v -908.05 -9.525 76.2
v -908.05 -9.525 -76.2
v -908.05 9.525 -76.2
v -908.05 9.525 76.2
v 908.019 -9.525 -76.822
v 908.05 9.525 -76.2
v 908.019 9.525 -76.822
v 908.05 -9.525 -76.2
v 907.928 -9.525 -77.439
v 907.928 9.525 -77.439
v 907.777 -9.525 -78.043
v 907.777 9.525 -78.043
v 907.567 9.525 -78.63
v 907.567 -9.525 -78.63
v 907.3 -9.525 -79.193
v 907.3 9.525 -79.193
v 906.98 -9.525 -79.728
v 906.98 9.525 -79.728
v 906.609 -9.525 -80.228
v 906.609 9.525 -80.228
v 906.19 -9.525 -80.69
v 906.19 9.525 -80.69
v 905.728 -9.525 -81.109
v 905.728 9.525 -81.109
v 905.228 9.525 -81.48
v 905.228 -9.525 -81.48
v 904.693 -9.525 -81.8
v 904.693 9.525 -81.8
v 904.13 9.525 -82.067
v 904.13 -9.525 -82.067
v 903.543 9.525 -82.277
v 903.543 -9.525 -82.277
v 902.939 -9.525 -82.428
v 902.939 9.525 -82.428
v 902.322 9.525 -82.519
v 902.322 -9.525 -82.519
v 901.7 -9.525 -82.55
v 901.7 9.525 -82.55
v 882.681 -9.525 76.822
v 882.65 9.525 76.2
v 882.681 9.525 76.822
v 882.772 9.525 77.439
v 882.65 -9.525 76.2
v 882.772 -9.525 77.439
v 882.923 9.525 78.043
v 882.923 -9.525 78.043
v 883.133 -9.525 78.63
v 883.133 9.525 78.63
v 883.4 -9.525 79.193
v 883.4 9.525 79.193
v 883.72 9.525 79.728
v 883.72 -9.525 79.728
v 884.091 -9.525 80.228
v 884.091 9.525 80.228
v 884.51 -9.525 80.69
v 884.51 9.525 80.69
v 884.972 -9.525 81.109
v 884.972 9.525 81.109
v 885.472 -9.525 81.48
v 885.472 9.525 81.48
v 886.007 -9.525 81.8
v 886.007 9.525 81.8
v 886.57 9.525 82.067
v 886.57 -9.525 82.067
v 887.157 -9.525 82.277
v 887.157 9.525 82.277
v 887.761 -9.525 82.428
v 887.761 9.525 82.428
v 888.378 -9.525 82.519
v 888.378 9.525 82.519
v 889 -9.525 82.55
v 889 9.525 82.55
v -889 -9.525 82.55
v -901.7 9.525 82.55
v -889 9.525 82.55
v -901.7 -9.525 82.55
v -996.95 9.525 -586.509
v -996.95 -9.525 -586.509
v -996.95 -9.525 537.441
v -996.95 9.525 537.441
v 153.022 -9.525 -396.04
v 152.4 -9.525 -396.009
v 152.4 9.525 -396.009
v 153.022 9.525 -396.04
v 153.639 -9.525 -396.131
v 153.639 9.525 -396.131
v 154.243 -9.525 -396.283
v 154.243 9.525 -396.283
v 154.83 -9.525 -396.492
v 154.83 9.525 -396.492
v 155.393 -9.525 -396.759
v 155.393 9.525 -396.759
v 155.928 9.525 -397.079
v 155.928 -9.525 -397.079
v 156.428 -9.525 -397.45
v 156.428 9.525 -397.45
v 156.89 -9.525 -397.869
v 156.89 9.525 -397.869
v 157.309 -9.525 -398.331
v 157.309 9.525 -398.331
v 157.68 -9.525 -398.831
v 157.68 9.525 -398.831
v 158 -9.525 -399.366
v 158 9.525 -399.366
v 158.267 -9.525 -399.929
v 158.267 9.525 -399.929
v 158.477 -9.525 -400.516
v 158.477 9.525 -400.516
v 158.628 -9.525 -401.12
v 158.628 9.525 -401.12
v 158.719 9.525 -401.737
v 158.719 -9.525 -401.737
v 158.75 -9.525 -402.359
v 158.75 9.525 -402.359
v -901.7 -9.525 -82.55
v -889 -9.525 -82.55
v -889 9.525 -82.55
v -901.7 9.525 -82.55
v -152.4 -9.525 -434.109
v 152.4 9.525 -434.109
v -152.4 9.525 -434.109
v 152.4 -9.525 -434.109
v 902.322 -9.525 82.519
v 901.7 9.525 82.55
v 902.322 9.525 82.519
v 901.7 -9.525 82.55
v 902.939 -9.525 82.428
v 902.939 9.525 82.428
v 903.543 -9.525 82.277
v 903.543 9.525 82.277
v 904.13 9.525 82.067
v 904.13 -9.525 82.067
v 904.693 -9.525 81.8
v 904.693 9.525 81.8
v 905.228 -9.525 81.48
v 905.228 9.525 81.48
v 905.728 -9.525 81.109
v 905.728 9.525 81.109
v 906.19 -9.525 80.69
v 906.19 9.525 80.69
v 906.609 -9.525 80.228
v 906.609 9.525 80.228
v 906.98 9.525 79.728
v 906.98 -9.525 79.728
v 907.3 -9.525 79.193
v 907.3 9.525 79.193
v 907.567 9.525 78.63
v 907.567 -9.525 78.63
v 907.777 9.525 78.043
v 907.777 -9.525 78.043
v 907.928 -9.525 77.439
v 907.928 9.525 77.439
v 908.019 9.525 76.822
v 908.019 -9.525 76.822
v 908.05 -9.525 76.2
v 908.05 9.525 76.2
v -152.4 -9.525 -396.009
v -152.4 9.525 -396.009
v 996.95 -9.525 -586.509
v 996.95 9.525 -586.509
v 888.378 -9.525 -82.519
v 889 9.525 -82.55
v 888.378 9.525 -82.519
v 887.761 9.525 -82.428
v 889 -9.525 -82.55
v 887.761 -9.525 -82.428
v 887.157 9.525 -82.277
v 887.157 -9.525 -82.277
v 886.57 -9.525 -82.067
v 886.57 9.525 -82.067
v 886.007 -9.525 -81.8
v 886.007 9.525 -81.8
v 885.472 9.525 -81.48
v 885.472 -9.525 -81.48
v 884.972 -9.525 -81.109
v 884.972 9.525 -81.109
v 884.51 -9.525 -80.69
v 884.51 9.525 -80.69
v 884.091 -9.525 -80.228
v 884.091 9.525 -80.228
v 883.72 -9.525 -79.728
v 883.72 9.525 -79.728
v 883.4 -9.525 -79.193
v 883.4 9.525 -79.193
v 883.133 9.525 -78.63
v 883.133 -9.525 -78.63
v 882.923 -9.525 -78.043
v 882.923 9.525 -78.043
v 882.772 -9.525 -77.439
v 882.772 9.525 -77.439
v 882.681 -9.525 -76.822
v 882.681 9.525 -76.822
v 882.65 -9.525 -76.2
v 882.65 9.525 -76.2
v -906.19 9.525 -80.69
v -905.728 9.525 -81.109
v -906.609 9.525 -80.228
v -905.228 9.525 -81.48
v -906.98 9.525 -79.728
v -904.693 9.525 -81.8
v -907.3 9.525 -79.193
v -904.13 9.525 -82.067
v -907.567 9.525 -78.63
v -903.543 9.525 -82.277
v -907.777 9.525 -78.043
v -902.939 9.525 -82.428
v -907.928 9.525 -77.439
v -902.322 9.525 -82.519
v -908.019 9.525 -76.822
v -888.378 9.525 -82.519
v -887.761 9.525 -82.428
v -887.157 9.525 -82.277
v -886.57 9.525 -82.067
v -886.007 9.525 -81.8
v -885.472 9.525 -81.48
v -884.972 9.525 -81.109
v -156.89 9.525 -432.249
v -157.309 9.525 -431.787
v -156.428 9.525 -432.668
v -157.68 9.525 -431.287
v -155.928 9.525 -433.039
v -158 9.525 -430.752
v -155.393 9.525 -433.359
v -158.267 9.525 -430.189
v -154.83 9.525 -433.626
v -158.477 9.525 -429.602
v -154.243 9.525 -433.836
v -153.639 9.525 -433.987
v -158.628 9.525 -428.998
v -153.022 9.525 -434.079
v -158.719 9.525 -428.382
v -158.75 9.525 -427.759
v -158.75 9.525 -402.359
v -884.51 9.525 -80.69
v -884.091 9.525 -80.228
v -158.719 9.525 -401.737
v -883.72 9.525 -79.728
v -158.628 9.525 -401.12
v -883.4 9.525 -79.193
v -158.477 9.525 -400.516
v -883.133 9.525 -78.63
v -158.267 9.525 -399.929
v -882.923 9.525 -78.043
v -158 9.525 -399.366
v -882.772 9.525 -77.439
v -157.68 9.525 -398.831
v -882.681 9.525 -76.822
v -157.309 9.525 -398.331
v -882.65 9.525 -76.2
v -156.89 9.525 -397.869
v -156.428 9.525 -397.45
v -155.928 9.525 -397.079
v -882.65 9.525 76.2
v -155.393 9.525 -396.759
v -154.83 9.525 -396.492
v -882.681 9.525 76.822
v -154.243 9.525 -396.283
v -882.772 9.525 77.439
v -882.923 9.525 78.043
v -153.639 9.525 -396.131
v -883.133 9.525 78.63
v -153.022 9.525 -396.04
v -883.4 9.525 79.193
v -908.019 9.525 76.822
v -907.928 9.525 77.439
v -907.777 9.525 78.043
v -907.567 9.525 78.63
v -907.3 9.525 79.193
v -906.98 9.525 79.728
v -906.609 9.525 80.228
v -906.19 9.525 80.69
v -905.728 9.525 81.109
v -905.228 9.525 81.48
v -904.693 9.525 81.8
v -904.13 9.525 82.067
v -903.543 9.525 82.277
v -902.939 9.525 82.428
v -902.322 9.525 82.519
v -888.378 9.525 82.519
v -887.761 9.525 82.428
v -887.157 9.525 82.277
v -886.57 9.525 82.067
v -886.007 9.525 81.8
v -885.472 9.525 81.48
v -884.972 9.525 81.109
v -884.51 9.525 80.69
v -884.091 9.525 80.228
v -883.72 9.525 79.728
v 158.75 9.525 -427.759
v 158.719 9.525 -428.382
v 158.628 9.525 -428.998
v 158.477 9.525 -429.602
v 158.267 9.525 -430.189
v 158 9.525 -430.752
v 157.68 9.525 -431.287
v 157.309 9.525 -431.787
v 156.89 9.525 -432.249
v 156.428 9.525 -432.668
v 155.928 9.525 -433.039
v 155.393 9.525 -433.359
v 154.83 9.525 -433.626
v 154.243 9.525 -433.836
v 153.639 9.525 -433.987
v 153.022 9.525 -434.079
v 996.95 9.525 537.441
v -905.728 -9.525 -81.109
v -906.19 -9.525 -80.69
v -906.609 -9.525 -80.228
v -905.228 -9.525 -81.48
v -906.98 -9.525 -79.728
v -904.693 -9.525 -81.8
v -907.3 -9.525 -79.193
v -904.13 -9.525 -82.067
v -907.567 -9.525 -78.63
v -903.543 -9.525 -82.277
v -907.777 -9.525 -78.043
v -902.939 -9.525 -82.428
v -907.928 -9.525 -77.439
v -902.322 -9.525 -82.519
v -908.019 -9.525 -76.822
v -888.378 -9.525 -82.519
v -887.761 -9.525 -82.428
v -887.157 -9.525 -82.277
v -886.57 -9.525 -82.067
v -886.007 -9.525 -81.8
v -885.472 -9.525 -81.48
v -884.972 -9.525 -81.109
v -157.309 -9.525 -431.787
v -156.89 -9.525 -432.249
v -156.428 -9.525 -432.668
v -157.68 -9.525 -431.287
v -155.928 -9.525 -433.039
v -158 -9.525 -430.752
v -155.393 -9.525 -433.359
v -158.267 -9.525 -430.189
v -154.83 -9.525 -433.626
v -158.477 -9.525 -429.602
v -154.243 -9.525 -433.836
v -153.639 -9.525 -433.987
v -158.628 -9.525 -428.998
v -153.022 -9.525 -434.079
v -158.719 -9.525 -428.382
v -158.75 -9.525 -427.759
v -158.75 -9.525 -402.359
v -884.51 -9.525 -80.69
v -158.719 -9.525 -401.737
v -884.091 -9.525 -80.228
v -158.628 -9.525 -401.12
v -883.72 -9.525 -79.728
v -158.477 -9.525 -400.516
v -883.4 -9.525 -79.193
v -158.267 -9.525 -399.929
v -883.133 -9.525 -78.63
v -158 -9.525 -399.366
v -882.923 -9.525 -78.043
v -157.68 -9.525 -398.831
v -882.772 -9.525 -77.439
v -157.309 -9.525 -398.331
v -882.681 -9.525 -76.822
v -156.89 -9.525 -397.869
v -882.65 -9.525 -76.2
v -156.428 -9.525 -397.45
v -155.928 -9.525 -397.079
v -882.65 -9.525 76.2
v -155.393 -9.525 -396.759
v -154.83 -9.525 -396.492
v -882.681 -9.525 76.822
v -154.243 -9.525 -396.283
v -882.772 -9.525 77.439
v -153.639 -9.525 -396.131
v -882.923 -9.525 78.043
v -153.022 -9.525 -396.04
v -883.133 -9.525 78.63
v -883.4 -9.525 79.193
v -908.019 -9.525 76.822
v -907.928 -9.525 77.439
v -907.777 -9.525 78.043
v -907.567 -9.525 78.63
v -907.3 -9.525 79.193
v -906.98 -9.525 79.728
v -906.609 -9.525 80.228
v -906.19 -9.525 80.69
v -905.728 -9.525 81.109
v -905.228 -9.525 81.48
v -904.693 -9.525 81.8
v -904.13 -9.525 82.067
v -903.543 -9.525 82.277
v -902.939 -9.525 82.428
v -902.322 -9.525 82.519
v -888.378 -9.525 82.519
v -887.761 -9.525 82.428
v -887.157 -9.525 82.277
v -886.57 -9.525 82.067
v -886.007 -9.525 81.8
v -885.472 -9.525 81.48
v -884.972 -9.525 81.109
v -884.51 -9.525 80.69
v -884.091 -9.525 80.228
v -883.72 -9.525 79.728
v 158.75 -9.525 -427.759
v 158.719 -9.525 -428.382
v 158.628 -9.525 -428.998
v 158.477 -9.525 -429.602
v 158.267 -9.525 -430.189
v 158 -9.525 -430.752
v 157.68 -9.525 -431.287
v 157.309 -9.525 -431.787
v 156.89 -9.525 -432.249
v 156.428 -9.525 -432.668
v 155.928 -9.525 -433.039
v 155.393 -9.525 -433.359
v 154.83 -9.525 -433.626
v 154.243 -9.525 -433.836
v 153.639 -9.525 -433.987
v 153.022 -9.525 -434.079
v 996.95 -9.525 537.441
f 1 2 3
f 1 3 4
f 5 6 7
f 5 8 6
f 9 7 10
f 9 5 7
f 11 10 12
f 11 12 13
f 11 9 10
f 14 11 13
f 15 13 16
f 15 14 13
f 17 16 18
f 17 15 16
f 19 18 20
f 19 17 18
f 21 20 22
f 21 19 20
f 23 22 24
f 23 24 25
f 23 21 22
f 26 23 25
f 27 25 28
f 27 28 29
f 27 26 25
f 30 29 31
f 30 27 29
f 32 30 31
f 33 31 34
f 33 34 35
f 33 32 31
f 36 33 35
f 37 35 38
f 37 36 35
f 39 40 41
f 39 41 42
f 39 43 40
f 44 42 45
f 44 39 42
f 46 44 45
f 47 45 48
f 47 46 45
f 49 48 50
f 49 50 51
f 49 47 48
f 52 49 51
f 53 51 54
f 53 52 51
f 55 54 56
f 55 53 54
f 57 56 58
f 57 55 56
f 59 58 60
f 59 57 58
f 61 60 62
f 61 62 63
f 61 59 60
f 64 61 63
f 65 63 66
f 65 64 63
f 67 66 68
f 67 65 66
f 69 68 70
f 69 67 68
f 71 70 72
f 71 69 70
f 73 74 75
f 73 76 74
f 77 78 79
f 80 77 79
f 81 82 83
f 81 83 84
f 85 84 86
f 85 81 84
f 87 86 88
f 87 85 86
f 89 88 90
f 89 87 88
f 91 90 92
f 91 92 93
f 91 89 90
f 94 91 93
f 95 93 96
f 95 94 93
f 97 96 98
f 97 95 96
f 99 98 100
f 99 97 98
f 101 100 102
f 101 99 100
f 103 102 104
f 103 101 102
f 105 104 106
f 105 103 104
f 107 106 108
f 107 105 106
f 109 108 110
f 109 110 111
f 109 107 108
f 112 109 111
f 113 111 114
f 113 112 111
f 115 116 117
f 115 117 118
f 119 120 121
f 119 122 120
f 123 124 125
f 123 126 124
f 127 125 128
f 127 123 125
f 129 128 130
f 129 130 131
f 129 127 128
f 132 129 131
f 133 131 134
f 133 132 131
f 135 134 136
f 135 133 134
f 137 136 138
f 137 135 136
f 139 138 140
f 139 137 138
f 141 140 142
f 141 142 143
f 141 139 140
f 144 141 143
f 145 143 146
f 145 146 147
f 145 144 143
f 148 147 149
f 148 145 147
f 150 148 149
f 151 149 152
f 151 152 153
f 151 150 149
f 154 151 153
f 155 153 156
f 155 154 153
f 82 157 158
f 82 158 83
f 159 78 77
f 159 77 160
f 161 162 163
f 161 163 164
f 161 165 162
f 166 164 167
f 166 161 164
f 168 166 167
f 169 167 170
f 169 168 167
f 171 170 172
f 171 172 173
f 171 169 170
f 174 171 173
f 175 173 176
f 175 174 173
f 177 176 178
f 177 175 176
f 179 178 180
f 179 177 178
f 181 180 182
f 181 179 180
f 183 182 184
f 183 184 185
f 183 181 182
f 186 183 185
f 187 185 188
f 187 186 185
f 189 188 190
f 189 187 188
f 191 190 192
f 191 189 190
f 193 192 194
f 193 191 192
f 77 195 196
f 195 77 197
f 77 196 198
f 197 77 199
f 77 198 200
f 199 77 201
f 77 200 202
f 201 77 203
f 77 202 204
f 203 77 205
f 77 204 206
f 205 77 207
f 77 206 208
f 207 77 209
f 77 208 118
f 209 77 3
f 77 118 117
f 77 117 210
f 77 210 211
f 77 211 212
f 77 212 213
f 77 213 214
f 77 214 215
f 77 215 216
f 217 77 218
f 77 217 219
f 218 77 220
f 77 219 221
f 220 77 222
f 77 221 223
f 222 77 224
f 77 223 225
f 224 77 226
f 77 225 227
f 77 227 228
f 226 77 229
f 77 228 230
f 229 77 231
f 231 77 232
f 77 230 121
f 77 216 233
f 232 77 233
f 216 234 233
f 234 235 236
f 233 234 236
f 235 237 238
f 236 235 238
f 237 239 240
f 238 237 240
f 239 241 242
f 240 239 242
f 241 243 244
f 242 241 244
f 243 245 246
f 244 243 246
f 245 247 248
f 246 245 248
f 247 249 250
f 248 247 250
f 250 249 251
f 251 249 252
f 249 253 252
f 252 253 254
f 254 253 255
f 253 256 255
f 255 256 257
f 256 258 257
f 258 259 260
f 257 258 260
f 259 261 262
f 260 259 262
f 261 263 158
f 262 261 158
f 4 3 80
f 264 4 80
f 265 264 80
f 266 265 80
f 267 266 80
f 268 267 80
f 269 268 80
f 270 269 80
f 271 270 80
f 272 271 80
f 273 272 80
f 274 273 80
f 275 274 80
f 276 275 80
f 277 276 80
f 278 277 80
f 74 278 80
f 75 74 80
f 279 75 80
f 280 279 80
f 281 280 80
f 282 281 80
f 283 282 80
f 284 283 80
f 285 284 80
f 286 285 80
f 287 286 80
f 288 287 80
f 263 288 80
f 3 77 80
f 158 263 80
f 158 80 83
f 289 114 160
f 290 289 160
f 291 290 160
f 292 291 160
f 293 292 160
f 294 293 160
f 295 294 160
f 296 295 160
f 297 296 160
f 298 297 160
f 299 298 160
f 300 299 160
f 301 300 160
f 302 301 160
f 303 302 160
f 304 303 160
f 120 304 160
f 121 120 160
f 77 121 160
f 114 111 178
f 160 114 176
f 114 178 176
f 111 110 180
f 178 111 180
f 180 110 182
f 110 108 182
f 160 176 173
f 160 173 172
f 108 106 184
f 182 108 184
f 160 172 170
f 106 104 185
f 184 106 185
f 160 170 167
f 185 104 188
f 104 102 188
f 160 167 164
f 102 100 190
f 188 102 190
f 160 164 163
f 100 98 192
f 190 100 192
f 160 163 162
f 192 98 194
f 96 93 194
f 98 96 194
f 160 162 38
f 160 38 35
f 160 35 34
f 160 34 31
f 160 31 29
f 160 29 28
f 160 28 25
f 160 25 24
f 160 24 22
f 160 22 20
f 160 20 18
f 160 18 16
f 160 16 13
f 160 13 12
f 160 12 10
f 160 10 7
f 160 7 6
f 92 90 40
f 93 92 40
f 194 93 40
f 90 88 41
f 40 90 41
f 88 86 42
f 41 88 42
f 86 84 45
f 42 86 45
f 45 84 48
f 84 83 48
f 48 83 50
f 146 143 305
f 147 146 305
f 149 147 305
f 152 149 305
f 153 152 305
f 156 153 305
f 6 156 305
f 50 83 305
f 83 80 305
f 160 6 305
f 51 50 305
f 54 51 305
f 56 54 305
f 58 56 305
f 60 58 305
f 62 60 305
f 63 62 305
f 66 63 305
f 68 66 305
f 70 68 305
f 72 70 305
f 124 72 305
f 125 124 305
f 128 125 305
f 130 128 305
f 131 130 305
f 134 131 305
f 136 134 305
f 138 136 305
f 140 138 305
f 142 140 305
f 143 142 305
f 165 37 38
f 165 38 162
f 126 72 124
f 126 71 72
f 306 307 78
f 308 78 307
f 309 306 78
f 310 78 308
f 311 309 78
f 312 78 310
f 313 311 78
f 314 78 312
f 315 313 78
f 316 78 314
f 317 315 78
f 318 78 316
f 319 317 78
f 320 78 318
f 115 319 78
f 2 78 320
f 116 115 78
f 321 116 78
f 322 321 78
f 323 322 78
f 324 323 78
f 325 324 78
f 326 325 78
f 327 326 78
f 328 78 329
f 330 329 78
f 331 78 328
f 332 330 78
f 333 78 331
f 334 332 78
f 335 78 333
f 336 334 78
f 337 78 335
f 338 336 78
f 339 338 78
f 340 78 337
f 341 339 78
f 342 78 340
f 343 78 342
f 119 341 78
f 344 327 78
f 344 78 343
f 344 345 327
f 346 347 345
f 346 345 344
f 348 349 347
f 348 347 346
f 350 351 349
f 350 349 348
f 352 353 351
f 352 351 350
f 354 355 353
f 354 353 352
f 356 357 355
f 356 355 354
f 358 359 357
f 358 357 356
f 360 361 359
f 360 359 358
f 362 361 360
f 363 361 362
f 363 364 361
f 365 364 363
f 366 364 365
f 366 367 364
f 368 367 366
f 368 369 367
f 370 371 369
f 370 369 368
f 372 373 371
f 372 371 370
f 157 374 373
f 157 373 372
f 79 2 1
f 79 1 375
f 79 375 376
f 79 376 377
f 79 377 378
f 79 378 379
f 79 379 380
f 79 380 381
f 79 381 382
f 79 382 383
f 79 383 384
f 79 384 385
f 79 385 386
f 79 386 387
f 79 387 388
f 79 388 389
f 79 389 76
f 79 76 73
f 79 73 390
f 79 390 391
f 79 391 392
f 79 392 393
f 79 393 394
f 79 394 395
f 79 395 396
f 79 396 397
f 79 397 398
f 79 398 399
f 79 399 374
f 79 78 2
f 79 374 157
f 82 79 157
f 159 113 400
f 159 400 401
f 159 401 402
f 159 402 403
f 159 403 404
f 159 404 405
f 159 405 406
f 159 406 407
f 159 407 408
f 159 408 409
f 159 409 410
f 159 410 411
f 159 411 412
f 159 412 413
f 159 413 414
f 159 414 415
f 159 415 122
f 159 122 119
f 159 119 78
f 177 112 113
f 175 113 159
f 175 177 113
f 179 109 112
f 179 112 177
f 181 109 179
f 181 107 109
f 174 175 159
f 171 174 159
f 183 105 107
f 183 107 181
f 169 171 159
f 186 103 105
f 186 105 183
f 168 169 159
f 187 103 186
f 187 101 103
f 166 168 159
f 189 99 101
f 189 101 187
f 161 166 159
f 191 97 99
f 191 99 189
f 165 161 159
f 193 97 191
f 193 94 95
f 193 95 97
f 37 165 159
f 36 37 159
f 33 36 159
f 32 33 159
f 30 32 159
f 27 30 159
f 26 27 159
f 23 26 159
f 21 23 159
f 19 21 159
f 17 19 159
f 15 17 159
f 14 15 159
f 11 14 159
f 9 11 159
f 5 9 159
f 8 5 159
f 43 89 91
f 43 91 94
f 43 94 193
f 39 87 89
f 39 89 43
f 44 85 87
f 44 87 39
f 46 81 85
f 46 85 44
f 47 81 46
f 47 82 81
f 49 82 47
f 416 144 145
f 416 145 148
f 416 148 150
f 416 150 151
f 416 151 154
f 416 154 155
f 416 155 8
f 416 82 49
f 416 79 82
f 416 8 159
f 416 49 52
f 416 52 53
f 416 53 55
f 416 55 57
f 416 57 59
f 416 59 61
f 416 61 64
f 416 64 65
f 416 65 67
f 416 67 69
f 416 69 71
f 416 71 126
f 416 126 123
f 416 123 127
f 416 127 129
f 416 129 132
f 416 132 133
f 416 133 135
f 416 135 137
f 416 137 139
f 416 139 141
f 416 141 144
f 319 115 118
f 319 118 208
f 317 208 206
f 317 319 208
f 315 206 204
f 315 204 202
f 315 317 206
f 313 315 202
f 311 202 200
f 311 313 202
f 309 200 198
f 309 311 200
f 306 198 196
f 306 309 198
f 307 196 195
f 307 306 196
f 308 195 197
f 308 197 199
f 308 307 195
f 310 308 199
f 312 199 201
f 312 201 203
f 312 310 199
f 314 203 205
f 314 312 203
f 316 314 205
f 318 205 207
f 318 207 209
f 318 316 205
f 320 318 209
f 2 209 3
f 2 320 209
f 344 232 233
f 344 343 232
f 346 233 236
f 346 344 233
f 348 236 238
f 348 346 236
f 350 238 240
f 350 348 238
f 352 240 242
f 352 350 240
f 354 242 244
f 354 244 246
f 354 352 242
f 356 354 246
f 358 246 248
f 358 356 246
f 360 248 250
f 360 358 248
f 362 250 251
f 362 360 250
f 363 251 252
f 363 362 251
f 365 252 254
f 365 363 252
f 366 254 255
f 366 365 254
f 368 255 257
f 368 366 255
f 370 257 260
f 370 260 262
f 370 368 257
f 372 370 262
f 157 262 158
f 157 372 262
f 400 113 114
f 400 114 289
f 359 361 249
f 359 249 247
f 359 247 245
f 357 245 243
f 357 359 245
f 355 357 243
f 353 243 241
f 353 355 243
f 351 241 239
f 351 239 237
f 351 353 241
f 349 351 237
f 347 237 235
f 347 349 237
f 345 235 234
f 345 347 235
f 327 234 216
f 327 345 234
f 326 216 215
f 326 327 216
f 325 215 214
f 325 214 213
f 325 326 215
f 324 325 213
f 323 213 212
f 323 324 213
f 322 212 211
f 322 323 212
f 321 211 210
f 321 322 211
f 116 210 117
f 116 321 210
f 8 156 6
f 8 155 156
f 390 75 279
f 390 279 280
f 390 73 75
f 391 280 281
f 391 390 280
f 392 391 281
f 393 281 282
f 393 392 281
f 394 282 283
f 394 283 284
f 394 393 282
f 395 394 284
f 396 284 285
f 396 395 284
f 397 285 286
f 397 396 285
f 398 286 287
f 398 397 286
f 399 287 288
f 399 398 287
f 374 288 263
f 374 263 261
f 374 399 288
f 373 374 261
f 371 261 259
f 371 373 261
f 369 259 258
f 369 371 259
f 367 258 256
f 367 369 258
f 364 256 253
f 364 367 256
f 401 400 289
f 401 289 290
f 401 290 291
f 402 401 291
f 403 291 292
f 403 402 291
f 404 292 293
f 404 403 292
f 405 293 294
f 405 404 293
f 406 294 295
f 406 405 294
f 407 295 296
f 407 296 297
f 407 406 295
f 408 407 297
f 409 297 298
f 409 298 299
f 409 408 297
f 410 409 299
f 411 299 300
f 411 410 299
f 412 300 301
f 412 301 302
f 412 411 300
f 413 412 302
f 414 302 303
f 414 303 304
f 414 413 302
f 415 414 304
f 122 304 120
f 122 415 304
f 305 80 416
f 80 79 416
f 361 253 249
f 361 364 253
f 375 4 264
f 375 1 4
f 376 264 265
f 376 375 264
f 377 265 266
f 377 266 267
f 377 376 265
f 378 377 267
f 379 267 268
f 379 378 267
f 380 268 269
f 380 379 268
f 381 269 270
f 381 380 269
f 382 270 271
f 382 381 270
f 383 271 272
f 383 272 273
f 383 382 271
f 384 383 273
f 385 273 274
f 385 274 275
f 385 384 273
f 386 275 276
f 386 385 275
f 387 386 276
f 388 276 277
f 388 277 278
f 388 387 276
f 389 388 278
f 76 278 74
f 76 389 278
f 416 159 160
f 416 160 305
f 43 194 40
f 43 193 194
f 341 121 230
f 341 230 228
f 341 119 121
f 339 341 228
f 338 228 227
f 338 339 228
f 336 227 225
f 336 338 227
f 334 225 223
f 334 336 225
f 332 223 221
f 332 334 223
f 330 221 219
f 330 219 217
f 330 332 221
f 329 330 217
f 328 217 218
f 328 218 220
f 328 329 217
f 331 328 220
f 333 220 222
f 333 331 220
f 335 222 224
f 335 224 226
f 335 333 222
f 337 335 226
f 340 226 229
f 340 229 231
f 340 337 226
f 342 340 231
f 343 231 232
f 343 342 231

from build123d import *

# Parameters (mm, degrees)
F0_W     = 1993.9
F0_H     = 1123.95
F1_DEPTH = 9.525


with BuildPart() as f1:
    # F0 (on Front) → F1 (new body, symmetric)
    with BuildSketch(Plane.XZ):
        with Locations((0, -24.534095)):
            Rectangle(F0_W, F0_H)
        with BuildLine():
            Line((-152.4, -396.009095), (152.4, -396.009095))
            ThreePointArc((152.4, -396.009095), (156.890128, -397.868967), (158.75, -402.359095))
            Line((158.75, -402.359095), (158.75, -427.759095))
            ThreePointArc((158.75, -427.759095), (156.890128, -432.249223), (152.4, -434.109095))
            Line((152.4, -434.109095), (-152.4, -434.109095))
            ThreePointArc((-152.4, -434.109095), (-156.890128, -432.249223), (-158.75, -427.759095))
            Line((-158.75, -427.759095), (-158.75, -402.359095))
            ThreePointArc((-158.75, -402.359095), (-156.890128, -397.868967), (-152.4, -396.009095))
        make_face(mode=Mode.SUBTRACT)
        with BuildLine():
            ThreePointArc((-882.65, -76.2), (-884.509872, -80.690128), (-889, -82.55))
            Line((-889, -82.55), (-901.7, -82.55))
            ThreePointArc((-901.7, -82.55), (-906.190128, -80.690128), (-908.05, -76.2))
            Line((-908.05, -76.2), (-908.05, 76.2))
            ThreePointArc((-908.05, 76.2), (-906.190128, 80.690128), (-901.7, 82.55))
            Line((-901.7, 82.55), (-889, 82.55))
            ThreePointArc((-889, 82.55), (-884.509872, 80.690128), (-882.65, 76.2))
            Line((-882.65, 76.2), (-882.65, -76.2))
        make_face(mode=Mode.SUBTRACT)
        with BuildLine():
            Line((901.7, -82.55), (889, -82.55))
            ThreePointArc((889, -82.55), (884.509872, -80.690128), (882.65, -76.2))
            Line((882.65, -76.2), (882.65, 76.2))
            ThreePointArc((882.65, 76.2), (884.509872, 80.690128), (889, 82.55))
            Line((889, 82.55), (901.7, 82.55))
            ThreePointArc((901.7, 82.55), (906.190128, 80.690128), (908.05, 76.2))
            Line((908.05, 76.2), (908.05, -76.2))
            ThreePointArc((908.05, -76.2), (906.190128, -80.690128), (901.7, -82.55))
        make_face(mode=Mode.SUBTRACT)
    extrude(amount=F1_DEPTH, both=True)


solid = f1.part
